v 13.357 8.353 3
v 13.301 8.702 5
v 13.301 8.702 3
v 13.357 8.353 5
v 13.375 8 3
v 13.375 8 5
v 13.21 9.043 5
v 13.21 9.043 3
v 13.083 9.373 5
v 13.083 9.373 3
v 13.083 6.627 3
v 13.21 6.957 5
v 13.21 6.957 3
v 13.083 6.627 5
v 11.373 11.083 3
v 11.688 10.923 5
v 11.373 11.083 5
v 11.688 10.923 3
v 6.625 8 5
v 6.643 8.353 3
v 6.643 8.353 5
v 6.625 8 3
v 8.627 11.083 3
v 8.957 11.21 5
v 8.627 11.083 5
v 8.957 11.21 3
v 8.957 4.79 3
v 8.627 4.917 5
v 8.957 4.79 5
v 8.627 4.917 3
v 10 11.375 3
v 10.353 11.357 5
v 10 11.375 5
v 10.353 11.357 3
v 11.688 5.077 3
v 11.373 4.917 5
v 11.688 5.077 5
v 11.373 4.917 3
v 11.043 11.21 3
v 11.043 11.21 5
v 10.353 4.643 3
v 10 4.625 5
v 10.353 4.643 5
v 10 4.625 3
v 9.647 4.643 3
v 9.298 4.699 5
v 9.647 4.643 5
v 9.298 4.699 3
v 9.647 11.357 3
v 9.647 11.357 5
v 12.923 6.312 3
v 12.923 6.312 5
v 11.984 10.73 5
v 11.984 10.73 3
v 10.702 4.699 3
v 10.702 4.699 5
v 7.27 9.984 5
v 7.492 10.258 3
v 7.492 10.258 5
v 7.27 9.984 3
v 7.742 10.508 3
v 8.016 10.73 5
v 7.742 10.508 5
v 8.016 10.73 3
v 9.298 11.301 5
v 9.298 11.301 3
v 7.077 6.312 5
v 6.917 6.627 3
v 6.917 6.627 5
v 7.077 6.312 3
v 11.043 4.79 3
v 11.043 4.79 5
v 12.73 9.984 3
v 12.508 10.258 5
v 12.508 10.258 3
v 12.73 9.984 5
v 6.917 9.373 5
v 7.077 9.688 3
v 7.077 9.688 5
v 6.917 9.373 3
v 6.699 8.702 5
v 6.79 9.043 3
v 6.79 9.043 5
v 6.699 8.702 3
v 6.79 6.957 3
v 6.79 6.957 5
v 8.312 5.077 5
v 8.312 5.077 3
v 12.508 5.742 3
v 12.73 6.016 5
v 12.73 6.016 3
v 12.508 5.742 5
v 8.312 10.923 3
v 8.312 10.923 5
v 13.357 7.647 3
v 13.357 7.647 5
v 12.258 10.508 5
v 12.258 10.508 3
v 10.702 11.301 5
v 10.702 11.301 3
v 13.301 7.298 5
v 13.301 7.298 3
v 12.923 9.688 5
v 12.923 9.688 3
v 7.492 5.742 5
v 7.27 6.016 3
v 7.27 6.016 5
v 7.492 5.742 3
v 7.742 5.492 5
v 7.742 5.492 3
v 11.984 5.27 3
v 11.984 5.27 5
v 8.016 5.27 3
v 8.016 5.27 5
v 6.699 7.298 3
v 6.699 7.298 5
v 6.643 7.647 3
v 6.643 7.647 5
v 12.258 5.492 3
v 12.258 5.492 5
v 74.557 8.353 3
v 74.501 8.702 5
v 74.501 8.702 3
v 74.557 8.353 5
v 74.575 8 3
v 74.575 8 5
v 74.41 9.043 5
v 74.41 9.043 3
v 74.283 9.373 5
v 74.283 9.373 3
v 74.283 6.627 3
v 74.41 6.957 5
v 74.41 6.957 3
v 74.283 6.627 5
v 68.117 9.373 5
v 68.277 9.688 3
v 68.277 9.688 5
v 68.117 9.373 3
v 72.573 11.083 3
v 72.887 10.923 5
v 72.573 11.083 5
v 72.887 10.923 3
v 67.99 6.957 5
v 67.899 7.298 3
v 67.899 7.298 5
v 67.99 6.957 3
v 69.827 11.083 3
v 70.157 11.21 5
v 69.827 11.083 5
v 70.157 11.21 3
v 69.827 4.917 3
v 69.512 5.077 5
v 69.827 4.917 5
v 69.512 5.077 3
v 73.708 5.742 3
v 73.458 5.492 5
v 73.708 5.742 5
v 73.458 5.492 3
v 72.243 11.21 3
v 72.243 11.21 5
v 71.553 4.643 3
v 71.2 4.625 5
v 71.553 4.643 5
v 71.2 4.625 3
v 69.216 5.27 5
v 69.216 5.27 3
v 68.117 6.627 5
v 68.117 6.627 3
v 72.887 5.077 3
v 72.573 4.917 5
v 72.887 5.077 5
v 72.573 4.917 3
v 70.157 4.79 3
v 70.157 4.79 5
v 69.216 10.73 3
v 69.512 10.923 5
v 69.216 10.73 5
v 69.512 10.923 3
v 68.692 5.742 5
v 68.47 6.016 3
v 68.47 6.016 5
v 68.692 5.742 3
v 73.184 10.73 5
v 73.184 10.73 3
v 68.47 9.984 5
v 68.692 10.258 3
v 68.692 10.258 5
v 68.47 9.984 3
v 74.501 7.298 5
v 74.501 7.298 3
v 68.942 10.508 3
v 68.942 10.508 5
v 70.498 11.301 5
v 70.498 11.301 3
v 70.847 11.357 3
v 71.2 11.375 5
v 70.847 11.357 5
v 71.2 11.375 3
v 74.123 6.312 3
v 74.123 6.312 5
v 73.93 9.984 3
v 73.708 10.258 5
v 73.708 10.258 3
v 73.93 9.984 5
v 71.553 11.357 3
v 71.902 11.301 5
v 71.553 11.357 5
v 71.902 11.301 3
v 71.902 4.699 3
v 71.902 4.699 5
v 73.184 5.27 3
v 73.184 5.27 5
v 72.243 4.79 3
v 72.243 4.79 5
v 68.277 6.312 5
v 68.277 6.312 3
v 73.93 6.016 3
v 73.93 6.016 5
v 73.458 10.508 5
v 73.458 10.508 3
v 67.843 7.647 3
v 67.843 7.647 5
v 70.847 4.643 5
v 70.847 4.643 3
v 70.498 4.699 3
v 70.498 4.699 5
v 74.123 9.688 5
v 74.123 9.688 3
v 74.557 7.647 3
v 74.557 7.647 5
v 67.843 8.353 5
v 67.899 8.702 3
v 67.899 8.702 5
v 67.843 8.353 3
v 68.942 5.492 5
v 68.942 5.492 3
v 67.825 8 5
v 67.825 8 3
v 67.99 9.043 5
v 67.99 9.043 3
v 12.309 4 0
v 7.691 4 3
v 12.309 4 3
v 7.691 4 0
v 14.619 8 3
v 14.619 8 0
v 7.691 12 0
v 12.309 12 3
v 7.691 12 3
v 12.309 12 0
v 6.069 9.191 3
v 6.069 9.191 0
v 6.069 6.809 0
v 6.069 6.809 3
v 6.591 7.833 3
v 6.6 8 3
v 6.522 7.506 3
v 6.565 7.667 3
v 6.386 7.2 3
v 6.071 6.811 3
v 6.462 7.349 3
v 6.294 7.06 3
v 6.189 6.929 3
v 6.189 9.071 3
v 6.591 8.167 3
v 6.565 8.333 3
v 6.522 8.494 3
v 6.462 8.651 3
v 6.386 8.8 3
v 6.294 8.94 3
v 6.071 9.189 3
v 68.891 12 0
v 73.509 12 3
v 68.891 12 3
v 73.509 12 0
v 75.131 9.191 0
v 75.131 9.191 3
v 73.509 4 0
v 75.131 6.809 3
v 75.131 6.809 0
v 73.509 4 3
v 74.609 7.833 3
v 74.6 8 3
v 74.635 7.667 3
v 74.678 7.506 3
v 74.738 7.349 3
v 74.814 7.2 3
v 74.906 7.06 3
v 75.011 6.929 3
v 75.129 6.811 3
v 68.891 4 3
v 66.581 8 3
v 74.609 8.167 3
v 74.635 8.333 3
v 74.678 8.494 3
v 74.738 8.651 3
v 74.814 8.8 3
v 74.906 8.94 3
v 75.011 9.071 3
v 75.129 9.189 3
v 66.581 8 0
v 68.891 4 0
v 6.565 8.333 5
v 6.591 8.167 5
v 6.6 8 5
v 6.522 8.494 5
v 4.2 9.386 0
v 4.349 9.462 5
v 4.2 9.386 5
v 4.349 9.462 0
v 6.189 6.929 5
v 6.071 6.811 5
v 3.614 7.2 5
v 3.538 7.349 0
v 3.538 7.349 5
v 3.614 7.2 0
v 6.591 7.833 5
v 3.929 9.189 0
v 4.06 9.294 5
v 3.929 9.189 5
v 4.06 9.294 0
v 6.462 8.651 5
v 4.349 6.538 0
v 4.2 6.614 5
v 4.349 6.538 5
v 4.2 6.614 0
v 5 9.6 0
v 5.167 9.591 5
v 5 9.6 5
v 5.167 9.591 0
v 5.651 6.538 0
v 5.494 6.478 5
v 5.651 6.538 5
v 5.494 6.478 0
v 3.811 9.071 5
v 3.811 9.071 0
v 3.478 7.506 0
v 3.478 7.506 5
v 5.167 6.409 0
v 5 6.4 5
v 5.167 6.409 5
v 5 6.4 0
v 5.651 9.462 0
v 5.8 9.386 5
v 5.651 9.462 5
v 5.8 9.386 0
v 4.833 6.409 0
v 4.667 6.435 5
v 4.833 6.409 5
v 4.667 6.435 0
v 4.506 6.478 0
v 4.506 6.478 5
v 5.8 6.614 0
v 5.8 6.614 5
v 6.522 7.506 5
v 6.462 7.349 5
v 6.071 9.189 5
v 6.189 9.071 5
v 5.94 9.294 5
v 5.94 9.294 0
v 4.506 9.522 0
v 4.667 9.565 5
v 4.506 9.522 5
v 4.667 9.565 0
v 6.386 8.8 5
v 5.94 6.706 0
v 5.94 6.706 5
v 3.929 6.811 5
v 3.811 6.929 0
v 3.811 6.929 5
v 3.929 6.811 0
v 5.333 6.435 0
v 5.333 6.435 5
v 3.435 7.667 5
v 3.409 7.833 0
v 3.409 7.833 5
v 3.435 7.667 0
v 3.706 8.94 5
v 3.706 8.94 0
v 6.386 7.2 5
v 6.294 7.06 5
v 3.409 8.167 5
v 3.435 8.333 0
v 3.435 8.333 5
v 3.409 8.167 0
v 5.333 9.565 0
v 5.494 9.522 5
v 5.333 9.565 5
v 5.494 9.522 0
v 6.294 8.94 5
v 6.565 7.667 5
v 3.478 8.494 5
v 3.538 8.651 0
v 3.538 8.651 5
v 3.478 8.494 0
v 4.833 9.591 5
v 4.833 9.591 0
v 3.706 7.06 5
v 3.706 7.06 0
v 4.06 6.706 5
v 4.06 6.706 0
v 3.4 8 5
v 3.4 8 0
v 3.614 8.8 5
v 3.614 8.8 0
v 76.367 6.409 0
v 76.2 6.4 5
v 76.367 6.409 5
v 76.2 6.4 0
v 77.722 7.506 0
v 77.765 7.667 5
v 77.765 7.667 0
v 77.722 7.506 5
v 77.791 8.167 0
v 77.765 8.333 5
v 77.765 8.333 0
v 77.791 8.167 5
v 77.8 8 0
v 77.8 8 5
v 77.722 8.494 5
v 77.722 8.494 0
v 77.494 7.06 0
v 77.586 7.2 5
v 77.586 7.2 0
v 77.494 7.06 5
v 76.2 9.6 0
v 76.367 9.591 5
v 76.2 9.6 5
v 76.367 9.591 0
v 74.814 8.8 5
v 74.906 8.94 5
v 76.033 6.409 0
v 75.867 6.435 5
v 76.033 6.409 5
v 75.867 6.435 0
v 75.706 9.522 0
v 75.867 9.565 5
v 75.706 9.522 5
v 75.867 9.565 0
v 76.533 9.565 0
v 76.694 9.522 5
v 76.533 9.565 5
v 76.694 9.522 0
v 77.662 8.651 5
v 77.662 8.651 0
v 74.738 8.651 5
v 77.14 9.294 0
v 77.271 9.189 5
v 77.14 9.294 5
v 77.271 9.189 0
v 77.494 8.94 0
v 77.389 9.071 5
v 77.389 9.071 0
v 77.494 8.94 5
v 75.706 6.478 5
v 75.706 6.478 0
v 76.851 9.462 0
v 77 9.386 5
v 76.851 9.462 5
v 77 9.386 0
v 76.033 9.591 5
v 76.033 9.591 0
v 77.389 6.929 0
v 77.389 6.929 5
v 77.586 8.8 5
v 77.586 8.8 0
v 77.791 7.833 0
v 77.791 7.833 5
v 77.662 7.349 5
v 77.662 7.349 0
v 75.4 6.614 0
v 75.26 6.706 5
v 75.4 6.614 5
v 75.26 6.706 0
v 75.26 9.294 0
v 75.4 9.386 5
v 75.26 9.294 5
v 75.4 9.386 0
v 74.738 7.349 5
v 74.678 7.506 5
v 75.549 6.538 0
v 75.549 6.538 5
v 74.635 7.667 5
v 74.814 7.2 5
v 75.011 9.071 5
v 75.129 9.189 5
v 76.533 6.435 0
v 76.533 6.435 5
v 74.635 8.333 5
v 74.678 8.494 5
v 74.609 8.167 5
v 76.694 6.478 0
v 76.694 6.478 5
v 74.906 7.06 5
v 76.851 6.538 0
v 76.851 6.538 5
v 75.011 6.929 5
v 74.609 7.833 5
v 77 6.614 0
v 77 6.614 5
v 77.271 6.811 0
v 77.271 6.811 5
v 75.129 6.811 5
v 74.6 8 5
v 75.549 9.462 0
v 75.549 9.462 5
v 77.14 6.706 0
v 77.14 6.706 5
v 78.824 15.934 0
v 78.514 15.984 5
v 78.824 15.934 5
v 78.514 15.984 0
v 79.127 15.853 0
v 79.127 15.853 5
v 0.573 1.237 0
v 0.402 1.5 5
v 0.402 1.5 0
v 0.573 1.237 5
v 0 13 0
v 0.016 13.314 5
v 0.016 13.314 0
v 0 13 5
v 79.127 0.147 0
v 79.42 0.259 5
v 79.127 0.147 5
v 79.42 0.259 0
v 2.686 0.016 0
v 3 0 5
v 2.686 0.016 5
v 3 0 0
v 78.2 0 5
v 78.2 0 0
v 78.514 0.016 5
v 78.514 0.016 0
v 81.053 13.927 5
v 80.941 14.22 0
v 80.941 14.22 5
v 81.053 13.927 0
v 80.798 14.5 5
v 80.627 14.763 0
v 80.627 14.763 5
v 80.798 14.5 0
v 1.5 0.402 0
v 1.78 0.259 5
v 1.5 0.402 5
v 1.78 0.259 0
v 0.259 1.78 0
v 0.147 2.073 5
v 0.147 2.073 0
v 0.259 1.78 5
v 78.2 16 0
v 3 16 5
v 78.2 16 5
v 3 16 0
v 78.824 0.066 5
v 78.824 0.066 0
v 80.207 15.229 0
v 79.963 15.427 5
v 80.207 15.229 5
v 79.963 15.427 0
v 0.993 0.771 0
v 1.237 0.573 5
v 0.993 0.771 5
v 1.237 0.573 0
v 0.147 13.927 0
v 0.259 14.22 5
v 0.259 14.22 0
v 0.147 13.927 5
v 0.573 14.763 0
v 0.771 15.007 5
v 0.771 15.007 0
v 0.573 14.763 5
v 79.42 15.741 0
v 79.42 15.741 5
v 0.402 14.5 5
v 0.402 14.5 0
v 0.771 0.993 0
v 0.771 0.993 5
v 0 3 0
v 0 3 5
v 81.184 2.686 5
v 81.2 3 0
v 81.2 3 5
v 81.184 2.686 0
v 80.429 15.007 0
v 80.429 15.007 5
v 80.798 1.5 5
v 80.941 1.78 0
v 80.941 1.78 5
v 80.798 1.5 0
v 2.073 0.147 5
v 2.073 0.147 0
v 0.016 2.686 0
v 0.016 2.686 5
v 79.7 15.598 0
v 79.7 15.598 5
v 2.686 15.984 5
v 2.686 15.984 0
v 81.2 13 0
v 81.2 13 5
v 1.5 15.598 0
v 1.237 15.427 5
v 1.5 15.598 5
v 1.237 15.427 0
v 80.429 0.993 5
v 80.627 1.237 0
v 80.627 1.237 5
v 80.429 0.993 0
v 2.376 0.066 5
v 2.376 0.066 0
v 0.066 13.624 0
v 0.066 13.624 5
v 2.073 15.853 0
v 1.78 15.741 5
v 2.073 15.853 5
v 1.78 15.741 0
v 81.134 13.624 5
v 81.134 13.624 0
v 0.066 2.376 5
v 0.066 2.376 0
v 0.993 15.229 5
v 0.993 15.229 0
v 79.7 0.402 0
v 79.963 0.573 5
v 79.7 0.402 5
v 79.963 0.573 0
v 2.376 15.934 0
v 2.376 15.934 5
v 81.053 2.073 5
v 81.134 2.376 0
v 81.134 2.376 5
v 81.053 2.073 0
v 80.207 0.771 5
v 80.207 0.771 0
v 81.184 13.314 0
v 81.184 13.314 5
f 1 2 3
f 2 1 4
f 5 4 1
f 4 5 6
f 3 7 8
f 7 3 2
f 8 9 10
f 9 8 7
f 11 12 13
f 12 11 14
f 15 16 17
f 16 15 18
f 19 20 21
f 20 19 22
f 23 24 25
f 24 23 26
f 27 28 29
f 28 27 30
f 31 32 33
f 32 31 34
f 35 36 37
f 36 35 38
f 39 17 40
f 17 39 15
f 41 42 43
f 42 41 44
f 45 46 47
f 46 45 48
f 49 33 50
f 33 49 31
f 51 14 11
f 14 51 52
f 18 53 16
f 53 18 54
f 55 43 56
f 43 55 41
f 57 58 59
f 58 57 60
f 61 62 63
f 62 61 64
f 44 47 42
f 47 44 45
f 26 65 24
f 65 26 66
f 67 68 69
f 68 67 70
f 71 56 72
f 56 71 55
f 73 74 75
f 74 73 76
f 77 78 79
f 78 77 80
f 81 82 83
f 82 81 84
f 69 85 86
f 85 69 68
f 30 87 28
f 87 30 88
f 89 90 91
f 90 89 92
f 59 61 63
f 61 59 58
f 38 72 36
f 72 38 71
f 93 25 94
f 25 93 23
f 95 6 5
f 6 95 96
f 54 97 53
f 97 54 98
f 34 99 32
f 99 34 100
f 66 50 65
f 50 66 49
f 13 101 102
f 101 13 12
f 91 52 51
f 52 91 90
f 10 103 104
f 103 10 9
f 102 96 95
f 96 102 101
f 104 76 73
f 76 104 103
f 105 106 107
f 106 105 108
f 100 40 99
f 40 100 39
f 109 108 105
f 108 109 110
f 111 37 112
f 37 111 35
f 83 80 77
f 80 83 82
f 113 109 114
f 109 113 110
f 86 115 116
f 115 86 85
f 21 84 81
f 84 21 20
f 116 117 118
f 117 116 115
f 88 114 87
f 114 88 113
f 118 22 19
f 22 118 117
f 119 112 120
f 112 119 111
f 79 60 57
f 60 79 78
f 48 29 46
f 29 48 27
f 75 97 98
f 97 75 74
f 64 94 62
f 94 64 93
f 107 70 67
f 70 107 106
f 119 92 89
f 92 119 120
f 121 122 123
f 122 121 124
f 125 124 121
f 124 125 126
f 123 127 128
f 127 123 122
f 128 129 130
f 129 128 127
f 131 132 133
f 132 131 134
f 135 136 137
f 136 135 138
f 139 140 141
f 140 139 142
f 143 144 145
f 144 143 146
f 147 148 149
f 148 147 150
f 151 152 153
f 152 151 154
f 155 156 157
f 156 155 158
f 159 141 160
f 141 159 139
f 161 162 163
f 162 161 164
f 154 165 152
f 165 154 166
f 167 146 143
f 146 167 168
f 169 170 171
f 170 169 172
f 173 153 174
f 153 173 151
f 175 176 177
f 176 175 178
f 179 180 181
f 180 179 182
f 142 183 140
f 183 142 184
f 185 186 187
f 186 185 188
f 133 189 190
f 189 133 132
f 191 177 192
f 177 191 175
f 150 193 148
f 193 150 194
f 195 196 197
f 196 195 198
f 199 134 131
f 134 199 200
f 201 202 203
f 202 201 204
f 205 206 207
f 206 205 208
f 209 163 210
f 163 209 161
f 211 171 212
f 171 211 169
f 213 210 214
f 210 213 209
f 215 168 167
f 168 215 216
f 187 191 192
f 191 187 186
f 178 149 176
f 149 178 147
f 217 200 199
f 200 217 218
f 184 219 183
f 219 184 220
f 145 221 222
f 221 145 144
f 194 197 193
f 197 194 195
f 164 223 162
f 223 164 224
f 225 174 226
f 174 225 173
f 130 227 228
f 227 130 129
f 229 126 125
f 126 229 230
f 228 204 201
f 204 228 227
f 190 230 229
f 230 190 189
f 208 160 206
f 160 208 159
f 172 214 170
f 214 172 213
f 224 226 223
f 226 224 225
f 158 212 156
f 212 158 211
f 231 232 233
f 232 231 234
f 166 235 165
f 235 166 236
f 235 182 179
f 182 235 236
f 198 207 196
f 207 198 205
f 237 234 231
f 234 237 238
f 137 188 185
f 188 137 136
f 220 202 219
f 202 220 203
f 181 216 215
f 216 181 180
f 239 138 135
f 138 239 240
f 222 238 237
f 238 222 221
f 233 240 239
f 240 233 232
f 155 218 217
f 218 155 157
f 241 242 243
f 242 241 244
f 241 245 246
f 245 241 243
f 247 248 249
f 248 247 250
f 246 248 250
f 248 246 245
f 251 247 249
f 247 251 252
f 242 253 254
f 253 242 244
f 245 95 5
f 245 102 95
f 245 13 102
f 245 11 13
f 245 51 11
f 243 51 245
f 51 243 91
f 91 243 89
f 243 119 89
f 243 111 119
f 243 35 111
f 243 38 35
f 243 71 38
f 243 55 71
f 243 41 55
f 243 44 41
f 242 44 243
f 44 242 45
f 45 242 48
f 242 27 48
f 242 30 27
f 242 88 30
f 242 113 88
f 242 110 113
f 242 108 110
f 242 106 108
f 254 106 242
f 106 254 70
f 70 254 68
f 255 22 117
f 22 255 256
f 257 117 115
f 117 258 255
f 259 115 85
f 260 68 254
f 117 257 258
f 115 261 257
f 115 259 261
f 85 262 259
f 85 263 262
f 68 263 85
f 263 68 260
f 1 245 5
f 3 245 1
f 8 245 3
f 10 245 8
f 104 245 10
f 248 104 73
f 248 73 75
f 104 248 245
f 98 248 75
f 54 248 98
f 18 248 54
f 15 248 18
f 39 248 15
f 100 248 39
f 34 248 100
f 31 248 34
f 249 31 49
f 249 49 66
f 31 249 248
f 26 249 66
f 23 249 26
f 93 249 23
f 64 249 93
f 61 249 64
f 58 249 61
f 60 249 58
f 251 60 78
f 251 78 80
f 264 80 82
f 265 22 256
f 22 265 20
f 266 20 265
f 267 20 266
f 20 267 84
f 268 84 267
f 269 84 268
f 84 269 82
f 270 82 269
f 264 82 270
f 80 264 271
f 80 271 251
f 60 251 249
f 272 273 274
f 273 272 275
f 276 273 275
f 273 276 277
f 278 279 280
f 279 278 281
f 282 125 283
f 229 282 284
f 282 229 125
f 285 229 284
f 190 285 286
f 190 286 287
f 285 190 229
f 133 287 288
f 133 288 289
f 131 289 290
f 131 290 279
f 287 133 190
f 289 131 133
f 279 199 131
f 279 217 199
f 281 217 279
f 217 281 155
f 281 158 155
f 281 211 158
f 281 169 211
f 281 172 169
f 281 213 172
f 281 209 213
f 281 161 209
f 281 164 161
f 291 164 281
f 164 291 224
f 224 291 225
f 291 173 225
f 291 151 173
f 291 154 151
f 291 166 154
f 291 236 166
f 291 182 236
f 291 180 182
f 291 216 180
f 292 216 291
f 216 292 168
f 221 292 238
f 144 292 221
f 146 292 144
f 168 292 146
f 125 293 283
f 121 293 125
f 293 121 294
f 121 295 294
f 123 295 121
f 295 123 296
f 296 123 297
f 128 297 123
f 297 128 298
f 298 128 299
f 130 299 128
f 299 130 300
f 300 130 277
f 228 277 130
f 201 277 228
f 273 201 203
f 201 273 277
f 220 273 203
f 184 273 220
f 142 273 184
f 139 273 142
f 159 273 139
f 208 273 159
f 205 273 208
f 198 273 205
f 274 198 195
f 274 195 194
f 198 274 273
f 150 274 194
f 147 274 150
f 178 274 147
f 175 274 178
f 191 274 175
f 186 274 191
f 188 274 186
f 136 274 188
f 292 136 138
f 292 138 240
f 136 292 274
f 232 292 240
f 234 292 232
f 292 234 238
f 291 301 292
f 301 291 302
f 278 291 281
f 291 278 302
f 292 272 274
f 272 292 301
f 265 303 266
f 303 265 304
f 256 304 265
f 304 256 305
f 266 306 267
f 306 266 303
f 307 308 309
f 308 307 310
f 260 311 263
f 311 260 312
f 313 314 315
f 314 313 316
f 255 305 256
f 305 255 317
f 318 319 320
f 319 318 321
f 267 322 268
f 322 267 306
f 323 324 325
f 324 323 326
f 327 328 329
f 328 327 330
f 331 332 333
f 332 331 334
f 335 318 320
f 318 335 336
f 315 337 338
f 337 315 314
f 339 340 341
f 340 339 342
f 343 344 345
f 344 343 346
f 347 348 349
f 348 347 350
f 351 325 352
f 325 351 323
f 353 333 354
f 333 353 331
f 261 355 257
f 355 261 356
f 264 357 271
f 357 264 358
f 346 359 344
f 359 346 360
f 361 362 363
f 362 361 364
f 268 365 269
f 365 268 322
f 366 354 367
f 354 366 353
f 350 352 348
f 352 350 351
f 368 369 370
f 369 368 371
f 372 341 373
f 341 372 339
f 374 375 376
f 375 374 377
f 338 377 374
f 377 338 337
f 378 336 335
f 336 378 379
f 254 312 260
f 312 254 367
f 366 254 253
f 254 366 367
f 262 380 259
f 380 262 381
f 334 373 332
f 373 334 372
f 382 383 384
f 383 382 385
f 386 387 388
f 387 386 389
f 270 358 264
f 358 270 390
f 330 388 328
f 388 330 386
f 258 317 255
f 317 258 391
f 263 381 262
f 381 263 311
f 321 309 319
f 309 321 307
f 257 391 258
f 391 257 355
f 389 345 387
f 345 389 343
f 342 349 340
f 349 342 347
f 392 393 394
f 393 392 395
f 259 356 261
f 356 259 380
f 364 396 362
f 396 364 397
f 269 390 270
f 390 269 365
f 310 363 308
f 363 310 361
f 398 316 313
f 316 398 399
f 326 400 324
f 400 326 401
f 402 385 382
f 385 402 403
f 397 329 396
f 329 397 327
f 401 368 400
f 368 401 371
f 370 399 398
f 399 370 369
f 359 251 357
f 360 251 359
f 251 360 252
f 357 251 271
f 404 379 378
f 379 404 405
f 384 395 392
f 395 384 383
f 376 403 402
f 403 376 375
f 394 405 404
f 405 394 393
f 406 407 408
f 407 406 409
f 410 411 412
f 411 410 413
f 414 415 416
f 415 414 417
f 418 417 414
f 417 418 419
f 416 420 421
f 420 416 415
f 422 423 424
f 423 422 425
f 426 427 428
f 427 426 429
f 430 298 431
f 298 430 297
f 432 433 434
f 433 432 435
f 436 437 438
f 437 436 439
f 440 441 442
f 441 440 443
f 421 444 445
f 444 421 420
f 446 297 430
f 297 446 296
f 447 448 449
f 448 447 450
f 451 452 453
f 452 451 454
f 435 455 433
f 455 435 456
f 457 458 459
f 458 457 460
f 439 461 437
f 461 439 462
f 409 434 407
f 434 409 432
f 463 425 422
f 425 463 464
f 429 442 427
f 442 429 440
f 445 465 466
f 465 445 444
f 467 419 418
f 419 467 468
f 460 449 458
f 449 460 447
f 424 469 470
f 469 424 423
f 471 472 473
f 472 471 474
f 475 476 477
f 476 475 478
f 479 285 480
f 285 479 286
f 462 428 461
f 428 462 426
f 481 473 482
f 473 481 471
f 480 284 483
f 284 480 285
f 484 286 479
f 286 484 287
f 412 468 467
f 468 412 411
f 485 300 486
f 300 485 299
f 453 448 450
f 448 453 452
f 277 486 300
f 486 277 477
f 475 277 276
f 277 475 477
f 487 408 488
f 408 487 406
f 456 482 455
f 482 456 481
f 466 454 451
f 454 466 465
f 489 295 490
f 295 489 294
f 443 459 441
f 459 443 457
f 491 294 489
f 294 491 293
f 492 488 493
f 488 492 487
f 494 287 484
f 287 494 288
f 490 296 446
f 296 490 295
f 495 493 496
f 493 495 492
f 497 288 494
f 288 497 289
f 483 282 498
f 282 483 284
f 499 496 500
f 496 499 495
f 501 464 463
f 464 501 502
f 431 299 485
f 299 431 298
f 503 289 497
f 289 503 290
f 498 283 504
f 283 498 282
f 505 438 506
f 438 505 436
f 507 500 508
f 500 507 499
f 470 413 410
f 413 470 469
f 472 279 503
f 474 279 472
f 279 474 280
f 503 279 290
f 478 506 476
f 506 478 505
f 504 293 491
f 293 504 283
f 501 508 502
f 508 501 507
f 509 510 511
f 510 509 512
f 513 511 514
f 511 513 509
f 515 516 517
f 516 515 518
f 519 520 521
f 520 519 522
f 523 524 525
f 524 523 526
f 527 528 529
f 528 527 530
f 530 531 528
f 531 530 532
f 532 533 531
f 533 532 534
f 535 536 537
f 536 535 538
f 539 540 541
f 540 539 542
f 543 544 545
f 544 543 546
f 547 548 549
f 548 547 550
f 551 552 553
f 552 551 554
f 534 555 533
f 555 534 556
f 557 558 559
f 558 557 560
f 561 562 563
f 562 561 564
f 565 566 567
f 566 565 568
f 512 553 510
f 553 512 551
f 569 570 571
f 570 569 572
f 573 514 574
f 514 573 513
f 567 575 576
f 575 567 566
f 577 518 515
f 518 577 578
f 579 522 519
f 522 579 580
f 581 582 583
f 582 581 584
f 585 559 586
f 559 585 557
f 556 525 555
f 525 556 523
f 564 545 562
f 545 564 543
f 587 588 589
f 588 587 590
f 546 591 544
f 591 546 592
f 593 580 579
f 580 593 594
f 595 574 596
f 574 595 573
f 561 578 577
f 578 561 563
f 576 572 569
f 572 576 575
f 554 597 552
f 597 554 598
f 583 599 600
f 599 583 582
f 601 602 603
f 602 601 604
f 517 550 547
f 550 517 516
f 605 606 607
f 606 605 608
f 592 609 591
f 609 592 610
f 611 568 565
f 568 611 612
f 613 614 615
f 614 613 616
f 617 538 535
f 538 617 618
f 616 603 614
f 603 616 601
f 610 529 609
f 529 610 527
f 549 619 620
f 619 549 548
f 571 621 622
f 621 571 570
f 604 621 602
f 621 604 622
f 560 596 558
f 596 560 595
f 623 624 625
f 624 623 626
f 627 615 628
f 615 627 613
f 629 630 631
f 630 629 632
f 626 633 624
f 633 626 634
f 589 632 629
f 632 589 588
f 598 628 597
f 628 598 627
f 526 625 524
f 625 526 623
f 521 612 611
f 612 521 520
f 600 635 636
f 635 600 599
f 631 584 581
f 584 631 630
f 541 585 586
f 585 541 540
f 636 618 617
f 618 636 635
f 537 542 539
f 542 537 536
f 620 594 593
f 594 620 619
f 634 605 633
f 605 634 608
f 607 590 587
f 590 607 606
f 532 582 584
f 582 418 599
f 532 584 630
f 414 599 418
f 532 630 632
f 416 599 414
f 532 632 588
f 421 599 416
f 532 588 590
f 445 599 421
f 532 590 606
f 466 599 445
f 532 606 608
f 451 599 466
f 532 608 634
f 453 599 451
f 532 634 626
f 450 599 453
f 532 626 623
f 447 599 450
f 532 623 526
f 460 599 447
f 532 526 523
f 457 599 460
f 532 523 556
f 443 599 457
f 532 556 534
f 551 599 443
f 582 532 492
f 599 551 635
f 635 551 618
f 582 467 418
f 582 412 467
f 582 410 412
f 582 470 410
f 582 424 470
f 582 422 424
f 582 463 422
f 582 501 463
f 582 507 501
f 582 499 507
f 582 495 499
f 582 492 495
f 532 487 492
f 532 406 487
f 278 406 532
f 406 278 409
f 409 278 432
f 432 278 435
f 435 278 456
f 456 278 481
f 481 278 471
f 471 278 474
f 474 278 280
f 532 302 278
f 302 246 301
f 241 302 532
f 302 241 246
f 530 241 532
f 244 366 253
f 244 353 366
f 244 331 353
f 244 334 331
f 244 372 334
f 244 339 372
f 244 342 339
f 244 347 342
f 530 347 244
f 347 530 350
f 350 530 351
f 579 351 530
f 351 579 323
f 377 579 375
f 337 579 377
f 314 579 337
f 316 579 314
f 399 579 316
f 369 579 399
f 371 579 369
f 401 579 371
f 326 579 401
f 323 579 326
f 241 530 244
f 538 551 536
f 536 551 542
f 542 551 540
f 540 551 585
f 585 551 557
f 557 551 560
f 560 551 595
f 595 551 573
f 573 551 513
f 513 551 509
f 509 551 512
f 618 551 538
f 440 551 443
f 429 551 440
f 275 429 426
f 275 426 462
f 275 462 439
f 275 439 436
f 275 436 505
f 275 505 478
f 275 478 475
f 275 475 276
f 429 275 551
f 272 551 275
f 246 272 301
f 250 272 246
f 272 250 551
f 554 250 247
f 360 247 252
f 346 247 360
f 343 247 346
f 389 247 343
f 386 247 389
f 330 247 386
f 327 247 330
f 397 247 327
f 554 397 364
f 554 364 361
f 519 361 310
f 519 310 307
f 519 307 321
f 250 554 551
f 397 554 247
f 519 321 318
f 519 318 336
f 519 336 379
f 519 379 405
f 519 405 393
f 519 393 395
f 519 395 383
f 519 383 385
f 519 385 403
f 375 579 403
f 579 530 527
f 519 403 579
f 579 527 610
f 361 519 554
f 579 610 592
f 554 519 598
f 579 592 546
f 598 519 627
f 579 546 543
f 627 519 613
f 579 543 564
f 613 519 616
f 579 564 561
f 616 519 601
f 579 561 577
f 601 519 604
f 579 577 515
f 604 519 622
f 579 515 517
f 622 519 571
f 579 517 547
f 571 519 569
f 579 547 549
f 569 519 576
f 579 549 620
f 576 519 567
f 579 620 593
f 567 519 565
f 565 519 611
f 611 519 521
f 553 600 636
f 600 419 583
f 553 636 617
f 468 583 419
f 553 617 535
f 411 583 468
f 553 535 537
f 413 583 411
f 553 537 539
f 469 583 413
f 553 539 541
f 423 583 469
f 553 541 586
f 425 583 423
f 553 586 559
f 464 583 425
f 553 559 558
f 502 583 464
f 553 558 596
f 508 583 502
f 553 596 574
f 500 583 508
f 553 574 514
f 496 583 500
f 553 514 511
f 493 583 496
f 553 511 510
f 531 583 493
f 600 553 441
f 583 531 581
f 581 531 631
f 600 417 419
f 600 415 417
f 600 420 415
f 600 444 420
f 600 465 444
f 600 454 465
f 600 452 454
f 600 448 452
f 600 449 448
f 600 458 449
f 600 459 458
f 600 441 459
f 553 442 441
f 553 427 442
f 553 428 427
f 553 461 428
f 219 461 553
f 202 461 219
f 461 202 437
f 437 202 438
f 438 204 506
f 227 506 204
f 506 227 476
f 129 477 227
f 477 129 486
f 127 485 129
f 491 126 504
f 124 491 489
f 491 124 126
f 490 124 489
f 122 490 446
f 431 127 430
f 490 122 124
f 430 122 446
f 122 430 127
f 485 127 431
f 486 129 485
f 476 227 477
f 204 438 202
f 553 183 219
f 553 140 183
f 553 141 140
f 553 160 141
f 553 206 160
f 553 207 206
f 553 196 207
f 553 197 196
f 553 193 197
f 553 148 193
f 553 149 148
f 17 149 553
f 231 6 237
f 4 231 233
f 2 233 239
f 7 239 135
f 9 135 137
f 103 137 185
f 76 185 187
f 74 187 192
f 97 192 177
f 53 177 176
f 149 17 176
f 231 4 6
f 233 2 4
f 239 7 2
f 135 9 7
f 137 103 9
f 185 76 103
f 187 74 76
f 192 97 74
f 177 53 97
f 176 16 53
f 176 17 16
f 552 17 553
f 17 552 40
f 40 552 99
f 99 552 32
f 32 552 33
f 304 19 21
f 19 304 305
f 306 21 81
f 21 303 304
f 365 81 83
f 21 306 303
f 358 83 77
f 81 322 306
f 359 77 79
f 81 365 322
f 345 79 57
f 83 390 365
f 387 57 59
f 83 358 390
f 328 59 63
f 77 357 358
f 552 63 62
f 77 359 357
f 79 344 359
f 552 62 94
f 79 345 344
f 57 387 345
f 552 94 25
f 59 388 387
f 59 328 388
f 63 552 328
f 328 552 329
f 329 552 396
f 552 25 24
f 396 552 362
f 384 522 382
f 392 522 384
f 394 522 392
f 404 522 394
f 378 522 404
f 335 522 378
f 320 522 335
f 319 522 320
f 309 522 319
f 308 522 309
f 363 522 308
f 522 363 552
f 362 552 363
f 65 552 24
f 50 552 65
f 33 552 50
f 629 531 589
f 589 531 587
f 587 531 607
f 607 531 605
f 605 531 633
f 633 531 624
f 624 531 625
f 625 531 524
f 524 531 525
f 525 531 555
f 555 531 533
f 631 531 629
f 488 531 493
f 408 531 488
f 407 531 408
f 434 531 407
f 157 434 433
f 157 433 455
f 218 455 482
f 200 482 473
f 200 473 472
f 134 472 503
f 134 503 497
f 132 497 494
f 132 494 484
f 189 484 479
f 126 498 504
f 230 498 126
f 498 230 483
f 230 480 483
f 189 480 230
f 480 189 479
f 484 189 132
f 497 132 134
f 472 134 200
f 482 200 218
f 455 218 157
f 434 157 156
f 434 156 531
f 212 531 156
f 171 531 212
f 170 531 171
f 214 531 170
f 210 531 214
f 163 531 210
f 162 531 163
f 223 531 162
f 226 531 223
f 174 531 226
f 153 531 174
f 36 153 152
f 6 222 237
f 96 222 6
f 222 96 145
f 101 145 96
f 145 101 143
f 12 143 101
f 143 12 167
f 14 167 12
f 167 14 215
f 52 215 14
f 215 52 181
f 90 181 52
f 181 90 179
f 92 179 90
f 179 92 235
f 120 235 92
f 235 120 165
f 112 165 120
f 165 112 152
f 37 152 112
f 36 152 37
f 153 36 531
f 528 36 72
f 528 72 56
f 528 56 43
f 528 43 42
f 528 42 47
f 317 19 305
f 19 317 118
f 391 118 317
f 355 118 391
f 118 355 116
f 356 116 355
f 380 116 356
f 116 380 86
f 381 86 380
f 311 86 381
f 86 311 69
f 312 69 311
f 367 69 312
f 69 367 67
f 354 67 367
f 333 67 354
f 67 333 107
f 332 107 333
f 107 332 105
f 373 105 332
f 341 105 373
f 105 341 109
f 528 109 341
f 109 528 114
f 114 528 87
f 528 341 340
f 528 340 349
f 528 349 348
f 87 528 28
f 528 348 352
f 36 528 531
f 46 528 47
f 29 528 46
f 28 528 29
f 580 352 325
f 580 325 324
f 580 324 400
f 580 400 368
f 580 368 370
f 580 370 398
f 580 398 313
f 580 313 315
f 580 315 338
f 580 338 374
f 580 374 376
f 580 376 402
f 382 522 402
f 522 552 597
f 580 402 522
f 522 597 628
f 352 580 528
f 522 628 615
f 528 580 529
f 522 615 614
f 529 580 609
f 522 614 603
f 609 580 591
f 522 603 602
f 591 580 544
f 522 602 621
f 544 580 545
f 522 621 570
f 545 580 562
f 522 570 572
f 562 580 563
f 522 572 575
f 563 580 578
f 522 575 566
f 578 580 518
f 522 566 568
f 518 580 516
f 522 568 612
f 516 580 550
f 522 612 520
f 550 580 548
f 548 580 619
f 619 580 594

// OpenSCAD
/* =========================================================
   Antenna Bracket — 2-element ULA mount for Meijia case lid

   Holds two SMA bulkhead connectors at exactly λ/2 spacing
   (61.2mm center-to-center @ 2.45 GHz).

   Mounts on the lid exterior, centered along the top long
   edge (opposite hinges, away from display cutout).

   Antennas fold flat when lid is closed, flip up 90° for use.

   Cross-section (lid closed):
       outside
   ┌────────────────────────┐
   │  ant1 (flat)  ant2     │  ← antennas folded
   │  ┌──┐  61.2mm  ┌──┐   │
   │  │SMA│         │SMA│   │  ← bracket
   ├──┴──┴──────────┴──┴────┤
   │        LID             │
   └────────────────────────┘
       inside

   Print settings:
     Orientation : flat on bed (mounting face down)
     Layer height: 0.15-0.20 mm
     Infill      : 50%+ (small part, needs rigidity)
     Supports    : none
     Material    : PETG preferred
   ========================================================= */


// ── ANTENNA PARAMETERS ─────────────────────────────────

// λ/2 spacing at 2.45 GHz
element_spacing = 61.2;        // mm center-to-center

// SMA bulkhead barrel diameter (standard = 6.35mm / 1/4")
// Measure yours and adjust if different
sma_barrel_d = 6.35;           // mm — hole for the SMA barrel
sma_clearance = 0.2;           // mm — fit tolerance per side
sma_hole_d = sma_barrel_d + 2 * sma_clearance;  // = 6.75mm

// SMA nut flat-to-flat (hex nut that tightens from inside)
// Standard SMA nut is ~8mm across flats
sma_nut_af = 8.0;              // mm across flats
sma_nut_h  = 3.0;              // mm nut height
// Hex recess diameter (circumscribed circle of hex)
sma_nut_d  = sma_nut_af / cos(30);  // ~9.24mm


// ── BRACKET PARAMETERS ─────────────────────────────────

// Bracket body
bracket_t   = 5.0;            // mm — thickness (SMA barrel + nut must fit)
bracket_h   = 16.0;           // mm — height (short axis, perpendicular to lid edge)
bracket_pad = 10.0;           // mm — padding beyond each SMA hole

// Derived length
bracket_l = element_spacing + 2 * bracket_pad;  // ~81.2mm

// Corner rounding
corner_r = 3.0;               // mm

// Mounting holes (M3 screws to attach bracket to lid)
mount_screw_d = 3.2;          // mm — M3 clearance hole
// Mounting holes placed at each end of the bracket
mount_inset_x = bracket_pad / 2;   // mm from bracket ends
mount_inset_y = bracket_h / 2;     // mm — centered vertically

$fn = 60;


// ── DERIVED POSITIONS ──────────────────────────────────

// SMA holes centered vertically, spaced along length
sma1_x = bracket_pad;                        // = 10mm from left edge
sma1_y = bracket_h / 2;
sma2_x = bracket_pad + element_spacing;      // = 71.2mm from left edge
sma2_y = bracket_h / 2;

echo("─── Antenna Bracket ─────────────────────────────────");
echo(str("  Element spacing:    ", element_spacing, " mm (λ/2 @ 2.45 GHz)"));
echo(str("  Bracket (L×H×T):    ", bracket_l, " × ", bracket_h, " × ", bracket_t, " mm"));
echo(str("  SMA hole diameter:  ", sma_hole_d, " mm"));
echo(str("  SMA 1 position:     (", sma1_x, ", ", sma1_y, ")"));
echo(str("  SMA 2 position:     (", sma2_x, ", ", sma2_y, ")"));
echo("─────────────────────────────────────────────────────");


// ── HELPERS ────────────────────────────────────────────

module rounded_rect(l, w, h, r) {
    hull() {
        for (xi = [r, l - r])
        for (yi = [r, w - r])
            translate([xi, yi, 0])
                cylinder(r = r, h = h);
    }
}

// Hexagonal recess for SMA nut (cut from bottom)
module hex_recess(af, h) {
    d = af / cos(30);
    cylinder(d = d, h = h, $fn = 6);
}


// ── MAIN BRACKET ───────────────────────────────────────

module antenna_bracket() {
    difference() {
        // ① Solid body
        rounded_rect(bracket_l, bracket_h, bracket_t, corner_r);

        // ② SMA barrel holes (through)
        for (pos = [[sma1_x, sma1_y], [sma2_x, sma2_y]]) {
            translate([pos[0], pos[1], -0.1])
                cylinder(d = sma_hole_d, h = bracket_t + 0.2);
        }

        // ③ Hex nut recesses on bottom face (so nut sits flush)
        for (pos = [[sma1_x, sma1_y], [sma2_x, sma2_y]]) {
            translate([pos[0], pos[1], -0.1])
                hex_recess(sma_nut_af, sma_nut_h + 0.1);
        }

        // ④ Mounting screw holes (M3, through)
        for (mx = [mount_inset_x, bracket_l - mount_inset_x]) {
            translate([mx, mount_inset_y, -0.1])
                cylinder(d = mount_screw_d, h = bracket_t + 0.2);
        }
    }
}


// ── LID DRILL TEMPLATE (optional) ─────────────────────
// Thin plate with hole positions marked — tape to lid,
// drill through the marked holes.

module lid_template() {
    template_t = 1.2;    // thin enough to print fast

    difference() {
        rounded_rect(bracket_l, bracket_h, template_t, corner_r);

        // SMA holes (mark only, same diameter)
        for (pos = [[sma1_x, sma1_y], [sma2_x, sma2_y]]) {
            translate([pos[0], pos[1], -0.1])
                cylinder(d = sma_hole_d, h = template_t + 0.2);
        }

        // Mounting holes
        for (mx = [mount_inset_x, bracket_l - mount_inset_x]) {
            translate([mx, mount_inset_y, -0.1])
                cylinder(d = mount_screw_d, h = template_t + 0.2);
        }
    }
}


// ── RENDER ─────────────────────────────────────────────

// Uncomment the part you want to export:

antenna_bracket();
//lid_template();
